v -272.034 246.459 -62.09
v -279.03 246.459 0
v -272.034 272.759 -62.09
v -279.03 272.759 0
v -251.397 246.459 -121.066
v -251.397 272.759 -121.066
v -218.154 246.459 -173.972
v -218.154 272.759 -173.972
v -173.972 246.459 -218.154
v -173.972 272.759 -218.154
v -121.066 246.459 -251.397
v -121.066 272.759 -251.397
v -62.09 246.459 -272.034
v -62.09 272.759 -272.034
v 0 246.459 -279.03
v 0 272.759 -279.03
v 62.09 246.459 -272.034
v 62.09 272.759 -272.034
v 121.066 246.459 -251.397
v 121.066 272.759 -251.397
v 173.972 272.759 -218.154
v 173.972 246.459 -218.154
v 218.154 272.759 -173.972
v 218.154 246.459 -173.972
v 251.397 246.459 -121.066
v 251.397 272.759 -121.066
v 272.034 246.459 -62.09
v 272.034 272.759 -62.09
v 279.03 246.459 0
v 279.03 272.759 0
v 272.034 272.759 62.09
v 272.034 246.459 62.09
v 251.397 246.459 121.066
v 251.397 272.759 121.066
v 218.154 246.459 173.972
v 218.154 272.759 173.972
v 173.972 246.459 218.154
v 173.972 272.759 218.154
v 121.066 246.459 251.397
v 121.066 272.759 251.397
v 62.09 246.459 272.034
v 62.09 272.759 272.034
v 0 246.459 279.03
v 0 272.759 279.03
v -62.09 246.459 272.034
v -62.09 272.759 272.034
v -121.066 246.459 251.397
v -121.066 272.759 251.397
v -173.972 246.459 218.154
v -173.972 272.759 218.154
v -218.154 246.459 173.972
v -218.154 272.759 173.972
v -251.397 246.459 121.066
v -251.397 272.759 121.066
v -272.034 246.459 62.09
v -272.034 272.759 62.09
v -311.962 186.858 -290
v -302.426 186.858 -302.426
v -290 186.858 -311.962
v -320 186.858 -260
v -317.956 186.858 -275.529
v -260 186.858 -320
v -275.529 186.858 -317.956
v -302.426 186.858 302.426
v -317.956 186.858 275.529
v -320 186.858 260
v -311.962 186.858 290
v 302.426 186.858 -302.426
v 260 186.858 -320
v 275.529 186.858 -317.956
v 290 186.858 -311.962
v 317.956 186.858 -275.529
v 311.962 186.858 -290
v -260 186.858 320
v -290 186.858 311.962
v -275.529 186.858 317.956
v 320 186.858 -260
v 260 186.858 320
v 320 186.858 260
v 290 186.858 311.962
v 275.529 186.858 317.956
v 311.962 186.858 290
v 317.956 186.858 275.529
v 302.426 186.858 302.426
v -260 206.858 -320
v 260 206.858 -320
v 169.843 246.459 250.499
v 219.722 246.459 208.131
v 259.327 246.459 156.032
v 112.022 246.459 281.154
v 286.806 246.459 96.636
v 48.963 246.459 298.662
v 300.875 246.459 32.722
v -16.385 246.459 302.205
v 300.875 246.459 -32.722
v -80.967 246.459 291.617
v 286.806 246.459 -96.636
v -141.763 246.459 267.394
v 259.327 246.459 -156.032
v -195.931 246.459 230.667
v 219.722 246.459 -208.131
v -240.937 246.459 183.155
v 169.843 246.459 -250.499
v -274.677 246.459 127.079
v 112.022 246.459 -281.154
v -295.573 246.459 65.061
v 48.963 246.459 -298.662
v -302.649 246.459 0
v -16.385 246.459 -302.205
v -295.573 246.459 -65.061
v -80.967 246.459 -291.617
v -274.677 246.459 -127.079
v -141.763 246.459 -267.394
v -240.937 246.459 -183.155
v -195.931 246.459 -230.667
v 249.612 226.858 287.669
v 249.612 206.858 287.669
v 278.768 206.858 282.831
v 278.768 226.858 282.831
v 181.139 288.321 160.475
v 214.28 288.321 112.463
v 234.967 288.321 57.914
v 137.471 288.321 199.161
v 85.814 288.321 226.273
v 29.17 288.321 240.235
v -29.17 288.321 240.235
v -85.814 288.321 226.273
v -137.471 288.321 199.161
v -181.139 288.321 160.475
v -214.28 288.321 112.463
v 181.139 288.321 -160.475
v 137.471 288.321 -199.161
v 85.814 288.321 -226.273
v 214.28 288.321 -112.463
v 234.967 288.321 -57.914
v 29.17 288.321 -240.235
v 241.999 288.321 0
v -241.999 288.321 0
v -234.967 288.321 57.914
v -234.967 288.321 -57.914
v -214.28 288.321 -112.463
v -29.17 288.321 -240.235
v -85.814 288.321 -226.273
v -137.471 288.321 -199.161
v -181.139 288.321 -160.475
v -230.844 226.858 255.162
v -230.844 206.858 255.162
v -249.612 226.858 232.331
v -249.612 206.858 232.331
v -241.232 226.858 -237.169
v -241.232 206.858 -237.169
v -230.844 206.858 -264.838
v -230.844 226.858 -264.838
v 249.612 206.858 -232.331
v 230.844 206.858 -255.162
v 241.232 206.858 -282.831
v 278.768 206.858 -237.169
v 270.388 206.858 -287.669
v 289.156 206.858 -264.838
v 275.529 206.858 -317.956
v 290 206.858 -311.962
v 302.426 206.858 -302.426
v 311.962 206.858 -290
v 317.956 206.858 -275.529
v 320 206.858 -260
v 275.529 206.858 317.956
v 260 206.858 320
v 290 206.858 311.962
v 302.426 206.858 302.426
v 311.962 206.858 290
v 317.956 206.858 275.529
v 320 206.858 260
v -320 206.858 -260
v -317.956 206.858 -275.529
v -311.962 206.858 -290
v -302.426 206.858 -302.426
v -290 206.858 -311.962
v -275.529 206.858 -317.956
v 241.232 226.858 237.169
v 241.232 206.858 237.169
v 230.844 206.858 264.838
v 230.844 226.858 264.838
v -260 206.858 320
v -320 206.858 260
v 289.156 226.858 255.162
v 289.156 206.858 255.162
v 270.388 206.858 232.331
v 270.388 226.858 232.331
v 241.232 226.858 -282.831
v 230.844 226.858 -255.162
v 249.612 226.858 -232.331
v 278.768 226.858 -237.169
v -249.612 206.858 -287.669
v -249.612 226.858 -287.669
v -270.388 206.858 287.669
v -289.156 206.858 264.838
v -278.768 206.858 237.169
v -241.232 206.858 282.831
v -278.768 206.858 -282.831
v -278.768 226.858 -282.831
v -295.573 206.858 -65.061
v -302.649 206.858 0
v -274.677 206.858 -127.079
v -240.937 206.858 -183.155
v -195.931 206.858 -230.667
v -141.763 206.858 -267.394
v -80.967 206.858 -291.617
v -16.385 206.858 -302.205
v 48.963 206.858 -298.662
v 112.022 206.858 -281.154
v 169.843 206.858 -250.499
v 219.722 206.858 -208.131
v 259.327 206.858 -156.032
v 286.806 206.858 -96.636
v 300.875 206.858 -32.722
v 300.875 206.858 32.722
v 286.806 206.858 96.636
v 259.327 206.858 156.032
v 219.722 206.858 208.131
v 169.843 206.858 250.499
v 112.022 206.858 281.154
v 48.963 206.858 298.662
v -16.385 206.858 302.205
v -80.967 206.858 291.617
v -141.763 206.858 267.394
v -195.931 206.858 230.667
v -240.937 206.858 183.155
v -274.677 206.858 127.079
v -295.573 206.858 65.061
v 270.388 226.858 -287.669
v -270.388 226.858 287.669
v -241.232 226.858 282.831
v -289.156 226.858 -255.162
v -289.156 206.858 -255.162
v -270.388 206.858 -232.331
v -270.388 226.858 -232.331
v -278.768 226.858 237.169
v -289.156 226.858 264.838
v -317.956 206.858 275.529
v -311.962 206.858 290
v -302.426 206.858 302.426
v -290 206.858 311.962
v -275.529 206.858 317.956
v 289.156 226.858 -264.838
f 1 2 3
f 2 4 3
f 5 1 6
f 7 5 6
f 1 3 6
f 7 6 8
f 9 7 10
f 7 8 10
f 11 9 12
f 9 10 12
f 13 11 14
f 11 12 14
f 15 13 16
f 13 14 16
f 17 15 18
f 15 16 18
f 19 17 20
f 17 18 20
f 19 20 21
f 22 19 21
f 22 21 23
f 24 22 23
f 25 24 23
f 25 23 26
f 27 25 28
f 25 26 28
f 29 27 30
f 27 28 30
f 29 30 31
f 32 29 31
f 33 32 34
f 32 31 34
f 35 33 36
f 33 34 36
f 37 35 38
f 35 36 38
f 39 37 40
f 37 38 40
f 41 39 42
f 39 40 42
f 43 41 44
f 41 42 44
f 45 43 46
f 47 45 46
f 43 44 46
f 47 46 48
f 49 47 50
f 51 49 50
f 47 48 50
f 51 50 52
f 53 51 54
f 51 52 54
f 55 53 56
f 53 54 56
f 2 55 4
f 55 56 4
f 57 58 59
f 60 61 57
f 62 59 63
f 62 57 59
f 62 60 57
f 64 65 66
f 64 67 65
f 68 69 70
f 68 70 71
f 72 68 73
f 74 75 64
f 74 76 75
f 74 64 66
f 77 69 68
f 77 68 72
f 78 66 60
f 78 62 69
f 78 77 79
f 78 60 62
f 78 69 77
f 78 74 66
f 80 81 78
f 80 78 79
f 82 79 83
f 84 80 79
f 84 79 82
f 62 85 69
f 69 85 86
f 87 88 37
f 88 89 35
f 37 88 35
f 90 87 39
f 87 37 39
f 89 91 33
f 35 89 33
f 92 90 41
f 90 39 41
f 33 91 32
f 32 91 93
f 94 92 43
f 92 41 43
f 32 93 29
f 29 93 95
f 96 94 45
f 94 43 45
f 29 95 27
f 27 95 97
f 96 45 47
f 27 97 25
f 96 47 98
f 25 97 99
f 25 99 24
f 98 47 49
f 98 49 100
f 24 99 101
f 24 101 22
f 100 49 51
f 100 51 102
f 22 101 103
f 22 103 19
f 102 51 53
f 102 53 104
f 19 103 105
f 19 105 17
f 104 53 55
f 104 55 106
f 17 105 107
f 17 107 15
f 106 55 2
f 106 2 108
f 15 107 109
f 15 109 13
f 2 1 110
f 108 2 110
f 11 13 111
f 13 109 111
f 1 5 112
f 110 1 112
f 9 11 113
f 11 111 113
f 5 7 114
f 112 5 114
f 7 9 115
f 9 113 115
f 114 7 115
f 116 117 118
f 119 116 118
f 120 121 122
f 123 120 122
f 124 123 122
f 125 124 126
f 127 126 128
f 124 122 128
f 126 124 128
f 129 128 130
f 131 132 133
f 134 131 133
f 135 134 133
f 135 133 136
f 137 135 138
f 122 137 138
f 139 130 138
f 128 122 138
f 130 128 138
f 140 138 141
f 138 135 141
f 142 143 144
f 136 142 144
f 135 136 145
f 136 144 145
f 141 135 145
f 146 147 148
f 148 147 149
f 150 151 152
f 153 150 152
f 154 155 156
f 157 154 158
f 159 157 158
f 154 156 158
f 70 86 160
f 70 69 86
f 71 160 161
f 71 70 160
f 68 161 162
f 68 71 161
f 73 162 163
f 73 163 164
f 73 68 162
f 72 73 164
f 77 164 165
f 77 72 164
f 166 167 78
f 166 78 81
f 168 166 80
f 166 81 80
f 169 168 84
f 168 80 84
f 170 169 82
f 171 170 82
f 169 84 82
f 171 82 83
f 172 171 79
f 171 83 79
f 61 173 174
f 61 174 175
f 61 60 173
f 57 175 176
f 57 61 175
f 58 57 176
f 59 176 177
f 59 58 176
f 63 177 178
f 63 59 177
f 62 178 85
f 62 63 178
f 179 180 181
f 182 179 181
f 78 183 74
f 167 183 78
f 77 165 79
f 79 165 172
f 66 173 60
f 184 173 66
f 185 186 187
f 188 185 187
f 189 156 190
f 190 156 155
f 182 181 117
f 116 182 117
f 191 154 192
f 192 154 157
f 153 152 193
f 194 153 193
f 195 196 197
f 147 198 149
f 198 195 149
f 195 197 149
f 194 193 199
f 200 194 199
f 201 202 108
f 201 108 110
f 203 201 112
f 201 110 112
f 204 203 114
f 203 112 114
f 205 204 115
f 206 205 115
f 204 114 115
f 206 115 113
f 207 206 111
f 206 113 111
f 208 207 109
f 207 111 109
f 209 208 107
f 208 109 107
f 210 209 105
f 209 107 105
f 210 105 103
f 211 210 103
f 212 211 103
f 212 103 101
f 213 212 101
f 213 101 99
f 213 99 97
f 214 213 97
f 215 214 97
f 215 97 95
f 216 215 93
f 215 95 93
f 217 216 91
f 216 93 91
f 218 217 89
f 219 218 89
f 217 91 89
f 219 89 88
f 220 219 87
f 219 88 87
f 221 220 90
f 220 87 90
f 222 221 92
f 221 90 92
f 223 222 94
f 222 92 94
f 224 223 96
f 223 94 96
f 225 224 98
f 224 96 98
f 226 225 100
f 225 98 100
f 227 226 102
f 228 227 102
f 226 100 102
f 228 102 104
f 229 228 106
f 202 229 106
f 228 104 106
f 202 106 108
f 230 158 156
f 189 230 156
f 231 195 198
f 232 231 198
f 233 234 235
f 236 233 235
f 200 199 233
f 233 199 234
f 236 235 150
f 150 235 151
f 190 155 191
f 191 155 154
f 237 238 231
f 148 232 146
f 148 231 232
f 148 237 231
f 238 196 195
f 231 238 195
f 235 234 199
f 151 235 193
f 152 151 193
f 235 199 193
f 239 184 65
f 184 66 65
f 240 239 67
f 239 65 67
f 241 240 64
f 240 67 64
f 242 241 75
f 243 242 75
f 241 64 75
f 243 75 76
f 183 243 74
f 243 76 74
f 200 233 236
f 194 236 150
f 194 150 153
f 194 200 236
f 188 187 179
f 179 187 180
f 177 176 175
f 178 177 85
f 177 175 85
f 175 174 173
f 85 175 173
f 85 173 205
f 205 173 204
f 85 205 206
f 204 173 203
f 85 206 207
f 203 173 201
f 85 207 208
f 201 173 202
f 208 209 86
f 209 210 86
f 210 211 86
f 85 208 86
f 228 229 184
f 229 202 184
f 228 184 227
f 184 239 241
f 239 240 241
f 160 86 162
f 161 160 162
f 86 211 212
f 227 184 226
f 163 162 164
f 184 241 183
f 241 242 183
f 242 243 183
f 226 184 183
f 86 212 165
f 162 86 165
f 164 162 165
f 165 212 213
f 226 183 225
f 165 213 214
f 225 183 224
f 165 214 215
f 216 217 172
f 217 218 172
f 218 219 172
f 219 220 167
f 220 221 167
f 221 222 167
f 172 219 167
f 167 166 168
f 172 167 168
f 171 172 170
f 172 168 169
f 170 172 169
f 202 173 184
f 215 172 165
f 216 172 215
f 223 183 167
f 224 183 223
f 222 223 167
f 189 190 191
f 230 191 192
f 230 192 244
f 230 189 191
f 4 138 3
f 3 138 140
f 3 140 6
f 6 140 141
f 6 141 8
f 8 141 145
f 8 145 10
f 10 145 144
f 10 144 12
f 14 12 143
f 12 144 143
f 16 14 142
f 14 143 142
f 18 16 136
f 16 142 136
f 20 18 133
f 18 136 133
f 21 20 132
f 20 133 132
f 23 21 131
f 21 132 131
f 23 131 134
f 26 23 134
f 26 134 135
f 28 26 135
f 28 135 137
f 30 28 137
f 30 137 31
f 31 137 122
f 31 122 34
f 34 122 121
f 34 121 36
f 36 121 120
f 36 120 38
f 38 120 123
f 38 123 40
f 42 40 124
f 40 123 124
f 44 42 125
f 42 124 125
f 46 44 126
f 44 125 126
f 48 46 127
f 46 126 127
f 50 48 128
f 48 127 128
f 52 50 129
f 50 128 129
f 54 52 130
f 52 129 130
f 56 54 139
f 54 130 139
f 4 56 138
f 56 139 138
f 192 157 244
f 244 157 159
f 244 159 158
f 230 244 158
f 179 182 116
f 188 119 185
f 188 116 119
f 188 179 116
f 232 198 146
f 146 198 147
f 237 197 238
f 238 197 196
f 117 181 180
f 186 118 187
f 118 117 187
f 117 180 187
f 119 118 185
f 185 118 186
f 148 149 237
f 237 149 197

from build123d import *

# Parameters (mm, degrees)
SKETCH3_W             = 640
SKETCH3_H             = 640
BOSS_EXTRUDE1_DEPTH   = 20
FILLET1_R             = 60
BOSS_EXTRUDE2_DEPTH   = 20
BOSS_EXTRUDE2_2_DEPTH = 20
BOSS_EXTRUDE2_3_DEPTH = 20
BOSS_EXTRUDE2_4_DEPTH = 20


with BuildPart() as part:
    # Sketch2 → Revolve1 (revolve)
    with BuildSketch(Plane.XY):
        Polygon((-302.648705723, 206.85825101), (-302.648705723, 246.458690992), (-279.029523186, 246.458690992), (-279.029523186, 272.758953847), (-241.999065544, 288.320794667), (0, 288.320794667), (0, 206.85825101), align=None)
    revolve(axis=Axis((0, 288.320794667, 0), (0, -1, 0)))

    # Sketch3 → Boss-Extrude1 (add)
    with BuildSketch(Plane.XZ.offset(-206.85825101)):
        Rectangle(SKETCH3_W, SKETCH3_H)
    extrude(amount=BOSS_EXTRUDE1_DEPTH)

    # Fillet1
    fillet1_edges = [part.edges().sort_by_distance(p)[0] for p in [
        (-320, 196.85825101, 320),
        (-320, 196.85825101, -320),
        (320, 196.85825101, -320),
        (320, 196.85825101, 320),
    ]]
    fillet(fillet1_edges, radius=FILLET1_R)


with BuildPart() as body_2:
    # Sketch4 → Boss-Extrude2 (new body)
    with BuildSketch(Plane(origin=(0, 206.85825101, 0), x_dir=(1, 0, 0), z_dir=(0, 1, 0))):
        Polygon((278.768084989, -282.831023015), (289.15628842, -255.161873127), (270.388203431, -232.330850112), (241.231915011, -237.168976985), (230.84371158, -264.838126873), (249.611796569, -287.669149888), align=None)
    extrude(amount=BOSS_EXTRUDE2_DEPTH)


with BuildPart() as body_3:
    # Sketch4 → Boss-Extrude2 2 (new body)
    with BuildSketch(Plane(origin=(0, 206.85825101, 0), x_dir=(1, 0, 0), z_dir=(0, 1, 0))):
        Polygon((-241.231915011, -282.831023015), (-230.84371158, -255.161873127), (-249.611796569, -232.330850112), (-278.768084989, -237.168976985), (-289.15628842, -264.838126873), (-270.388203431, -287.669149888), align=None)
    extrude(amount=BOSS_EXTRUDE2_2_DEPTH)


with BuildPart() as body_4:
    # Sketch4 → Boss-Extrude2 3 (new body)
    with BuildSketch(Plane(origin=(0, 206.85825101, 0), x_dir=(1, 0, 0), z_dir=(0, 1, 0))):
        Polygon((230.84371158, 255.161873127), (249.611796569, 232.330850112), (278.768084989, 237.168976985), (289.15628842, 264.838126873), (270.388203431, 287.669149888), (241.231915011, 282.831023015), align=None)
    extrude(amount=BOSS_EXTRUDE2_3_DEPTH)


with BuildPart() as body_5:
    # Sketch4 → Boss-Extrude2 4 (new body)
    with BuildSketch(Plane(origin=(0, 206.85825101, 0), x_dir=(1, 0, 0), z_dir=(0, 1, 0))):
        Polygon((-289.15628842, 255.161873127), (-270.388203431, 232.330850112), (-241.231915011, 237.168976985), (-230.84371158, 264.838126873), (-249.611796569, 287.669149888), (-278.768084989, 282.831023015), align=None)
    extrude(amount=BOSS_EXTRUDE2_4_DEPTH)


solid = Compound([part.part, body_2.part, body_3.part, body_4.part, body_5.part])
